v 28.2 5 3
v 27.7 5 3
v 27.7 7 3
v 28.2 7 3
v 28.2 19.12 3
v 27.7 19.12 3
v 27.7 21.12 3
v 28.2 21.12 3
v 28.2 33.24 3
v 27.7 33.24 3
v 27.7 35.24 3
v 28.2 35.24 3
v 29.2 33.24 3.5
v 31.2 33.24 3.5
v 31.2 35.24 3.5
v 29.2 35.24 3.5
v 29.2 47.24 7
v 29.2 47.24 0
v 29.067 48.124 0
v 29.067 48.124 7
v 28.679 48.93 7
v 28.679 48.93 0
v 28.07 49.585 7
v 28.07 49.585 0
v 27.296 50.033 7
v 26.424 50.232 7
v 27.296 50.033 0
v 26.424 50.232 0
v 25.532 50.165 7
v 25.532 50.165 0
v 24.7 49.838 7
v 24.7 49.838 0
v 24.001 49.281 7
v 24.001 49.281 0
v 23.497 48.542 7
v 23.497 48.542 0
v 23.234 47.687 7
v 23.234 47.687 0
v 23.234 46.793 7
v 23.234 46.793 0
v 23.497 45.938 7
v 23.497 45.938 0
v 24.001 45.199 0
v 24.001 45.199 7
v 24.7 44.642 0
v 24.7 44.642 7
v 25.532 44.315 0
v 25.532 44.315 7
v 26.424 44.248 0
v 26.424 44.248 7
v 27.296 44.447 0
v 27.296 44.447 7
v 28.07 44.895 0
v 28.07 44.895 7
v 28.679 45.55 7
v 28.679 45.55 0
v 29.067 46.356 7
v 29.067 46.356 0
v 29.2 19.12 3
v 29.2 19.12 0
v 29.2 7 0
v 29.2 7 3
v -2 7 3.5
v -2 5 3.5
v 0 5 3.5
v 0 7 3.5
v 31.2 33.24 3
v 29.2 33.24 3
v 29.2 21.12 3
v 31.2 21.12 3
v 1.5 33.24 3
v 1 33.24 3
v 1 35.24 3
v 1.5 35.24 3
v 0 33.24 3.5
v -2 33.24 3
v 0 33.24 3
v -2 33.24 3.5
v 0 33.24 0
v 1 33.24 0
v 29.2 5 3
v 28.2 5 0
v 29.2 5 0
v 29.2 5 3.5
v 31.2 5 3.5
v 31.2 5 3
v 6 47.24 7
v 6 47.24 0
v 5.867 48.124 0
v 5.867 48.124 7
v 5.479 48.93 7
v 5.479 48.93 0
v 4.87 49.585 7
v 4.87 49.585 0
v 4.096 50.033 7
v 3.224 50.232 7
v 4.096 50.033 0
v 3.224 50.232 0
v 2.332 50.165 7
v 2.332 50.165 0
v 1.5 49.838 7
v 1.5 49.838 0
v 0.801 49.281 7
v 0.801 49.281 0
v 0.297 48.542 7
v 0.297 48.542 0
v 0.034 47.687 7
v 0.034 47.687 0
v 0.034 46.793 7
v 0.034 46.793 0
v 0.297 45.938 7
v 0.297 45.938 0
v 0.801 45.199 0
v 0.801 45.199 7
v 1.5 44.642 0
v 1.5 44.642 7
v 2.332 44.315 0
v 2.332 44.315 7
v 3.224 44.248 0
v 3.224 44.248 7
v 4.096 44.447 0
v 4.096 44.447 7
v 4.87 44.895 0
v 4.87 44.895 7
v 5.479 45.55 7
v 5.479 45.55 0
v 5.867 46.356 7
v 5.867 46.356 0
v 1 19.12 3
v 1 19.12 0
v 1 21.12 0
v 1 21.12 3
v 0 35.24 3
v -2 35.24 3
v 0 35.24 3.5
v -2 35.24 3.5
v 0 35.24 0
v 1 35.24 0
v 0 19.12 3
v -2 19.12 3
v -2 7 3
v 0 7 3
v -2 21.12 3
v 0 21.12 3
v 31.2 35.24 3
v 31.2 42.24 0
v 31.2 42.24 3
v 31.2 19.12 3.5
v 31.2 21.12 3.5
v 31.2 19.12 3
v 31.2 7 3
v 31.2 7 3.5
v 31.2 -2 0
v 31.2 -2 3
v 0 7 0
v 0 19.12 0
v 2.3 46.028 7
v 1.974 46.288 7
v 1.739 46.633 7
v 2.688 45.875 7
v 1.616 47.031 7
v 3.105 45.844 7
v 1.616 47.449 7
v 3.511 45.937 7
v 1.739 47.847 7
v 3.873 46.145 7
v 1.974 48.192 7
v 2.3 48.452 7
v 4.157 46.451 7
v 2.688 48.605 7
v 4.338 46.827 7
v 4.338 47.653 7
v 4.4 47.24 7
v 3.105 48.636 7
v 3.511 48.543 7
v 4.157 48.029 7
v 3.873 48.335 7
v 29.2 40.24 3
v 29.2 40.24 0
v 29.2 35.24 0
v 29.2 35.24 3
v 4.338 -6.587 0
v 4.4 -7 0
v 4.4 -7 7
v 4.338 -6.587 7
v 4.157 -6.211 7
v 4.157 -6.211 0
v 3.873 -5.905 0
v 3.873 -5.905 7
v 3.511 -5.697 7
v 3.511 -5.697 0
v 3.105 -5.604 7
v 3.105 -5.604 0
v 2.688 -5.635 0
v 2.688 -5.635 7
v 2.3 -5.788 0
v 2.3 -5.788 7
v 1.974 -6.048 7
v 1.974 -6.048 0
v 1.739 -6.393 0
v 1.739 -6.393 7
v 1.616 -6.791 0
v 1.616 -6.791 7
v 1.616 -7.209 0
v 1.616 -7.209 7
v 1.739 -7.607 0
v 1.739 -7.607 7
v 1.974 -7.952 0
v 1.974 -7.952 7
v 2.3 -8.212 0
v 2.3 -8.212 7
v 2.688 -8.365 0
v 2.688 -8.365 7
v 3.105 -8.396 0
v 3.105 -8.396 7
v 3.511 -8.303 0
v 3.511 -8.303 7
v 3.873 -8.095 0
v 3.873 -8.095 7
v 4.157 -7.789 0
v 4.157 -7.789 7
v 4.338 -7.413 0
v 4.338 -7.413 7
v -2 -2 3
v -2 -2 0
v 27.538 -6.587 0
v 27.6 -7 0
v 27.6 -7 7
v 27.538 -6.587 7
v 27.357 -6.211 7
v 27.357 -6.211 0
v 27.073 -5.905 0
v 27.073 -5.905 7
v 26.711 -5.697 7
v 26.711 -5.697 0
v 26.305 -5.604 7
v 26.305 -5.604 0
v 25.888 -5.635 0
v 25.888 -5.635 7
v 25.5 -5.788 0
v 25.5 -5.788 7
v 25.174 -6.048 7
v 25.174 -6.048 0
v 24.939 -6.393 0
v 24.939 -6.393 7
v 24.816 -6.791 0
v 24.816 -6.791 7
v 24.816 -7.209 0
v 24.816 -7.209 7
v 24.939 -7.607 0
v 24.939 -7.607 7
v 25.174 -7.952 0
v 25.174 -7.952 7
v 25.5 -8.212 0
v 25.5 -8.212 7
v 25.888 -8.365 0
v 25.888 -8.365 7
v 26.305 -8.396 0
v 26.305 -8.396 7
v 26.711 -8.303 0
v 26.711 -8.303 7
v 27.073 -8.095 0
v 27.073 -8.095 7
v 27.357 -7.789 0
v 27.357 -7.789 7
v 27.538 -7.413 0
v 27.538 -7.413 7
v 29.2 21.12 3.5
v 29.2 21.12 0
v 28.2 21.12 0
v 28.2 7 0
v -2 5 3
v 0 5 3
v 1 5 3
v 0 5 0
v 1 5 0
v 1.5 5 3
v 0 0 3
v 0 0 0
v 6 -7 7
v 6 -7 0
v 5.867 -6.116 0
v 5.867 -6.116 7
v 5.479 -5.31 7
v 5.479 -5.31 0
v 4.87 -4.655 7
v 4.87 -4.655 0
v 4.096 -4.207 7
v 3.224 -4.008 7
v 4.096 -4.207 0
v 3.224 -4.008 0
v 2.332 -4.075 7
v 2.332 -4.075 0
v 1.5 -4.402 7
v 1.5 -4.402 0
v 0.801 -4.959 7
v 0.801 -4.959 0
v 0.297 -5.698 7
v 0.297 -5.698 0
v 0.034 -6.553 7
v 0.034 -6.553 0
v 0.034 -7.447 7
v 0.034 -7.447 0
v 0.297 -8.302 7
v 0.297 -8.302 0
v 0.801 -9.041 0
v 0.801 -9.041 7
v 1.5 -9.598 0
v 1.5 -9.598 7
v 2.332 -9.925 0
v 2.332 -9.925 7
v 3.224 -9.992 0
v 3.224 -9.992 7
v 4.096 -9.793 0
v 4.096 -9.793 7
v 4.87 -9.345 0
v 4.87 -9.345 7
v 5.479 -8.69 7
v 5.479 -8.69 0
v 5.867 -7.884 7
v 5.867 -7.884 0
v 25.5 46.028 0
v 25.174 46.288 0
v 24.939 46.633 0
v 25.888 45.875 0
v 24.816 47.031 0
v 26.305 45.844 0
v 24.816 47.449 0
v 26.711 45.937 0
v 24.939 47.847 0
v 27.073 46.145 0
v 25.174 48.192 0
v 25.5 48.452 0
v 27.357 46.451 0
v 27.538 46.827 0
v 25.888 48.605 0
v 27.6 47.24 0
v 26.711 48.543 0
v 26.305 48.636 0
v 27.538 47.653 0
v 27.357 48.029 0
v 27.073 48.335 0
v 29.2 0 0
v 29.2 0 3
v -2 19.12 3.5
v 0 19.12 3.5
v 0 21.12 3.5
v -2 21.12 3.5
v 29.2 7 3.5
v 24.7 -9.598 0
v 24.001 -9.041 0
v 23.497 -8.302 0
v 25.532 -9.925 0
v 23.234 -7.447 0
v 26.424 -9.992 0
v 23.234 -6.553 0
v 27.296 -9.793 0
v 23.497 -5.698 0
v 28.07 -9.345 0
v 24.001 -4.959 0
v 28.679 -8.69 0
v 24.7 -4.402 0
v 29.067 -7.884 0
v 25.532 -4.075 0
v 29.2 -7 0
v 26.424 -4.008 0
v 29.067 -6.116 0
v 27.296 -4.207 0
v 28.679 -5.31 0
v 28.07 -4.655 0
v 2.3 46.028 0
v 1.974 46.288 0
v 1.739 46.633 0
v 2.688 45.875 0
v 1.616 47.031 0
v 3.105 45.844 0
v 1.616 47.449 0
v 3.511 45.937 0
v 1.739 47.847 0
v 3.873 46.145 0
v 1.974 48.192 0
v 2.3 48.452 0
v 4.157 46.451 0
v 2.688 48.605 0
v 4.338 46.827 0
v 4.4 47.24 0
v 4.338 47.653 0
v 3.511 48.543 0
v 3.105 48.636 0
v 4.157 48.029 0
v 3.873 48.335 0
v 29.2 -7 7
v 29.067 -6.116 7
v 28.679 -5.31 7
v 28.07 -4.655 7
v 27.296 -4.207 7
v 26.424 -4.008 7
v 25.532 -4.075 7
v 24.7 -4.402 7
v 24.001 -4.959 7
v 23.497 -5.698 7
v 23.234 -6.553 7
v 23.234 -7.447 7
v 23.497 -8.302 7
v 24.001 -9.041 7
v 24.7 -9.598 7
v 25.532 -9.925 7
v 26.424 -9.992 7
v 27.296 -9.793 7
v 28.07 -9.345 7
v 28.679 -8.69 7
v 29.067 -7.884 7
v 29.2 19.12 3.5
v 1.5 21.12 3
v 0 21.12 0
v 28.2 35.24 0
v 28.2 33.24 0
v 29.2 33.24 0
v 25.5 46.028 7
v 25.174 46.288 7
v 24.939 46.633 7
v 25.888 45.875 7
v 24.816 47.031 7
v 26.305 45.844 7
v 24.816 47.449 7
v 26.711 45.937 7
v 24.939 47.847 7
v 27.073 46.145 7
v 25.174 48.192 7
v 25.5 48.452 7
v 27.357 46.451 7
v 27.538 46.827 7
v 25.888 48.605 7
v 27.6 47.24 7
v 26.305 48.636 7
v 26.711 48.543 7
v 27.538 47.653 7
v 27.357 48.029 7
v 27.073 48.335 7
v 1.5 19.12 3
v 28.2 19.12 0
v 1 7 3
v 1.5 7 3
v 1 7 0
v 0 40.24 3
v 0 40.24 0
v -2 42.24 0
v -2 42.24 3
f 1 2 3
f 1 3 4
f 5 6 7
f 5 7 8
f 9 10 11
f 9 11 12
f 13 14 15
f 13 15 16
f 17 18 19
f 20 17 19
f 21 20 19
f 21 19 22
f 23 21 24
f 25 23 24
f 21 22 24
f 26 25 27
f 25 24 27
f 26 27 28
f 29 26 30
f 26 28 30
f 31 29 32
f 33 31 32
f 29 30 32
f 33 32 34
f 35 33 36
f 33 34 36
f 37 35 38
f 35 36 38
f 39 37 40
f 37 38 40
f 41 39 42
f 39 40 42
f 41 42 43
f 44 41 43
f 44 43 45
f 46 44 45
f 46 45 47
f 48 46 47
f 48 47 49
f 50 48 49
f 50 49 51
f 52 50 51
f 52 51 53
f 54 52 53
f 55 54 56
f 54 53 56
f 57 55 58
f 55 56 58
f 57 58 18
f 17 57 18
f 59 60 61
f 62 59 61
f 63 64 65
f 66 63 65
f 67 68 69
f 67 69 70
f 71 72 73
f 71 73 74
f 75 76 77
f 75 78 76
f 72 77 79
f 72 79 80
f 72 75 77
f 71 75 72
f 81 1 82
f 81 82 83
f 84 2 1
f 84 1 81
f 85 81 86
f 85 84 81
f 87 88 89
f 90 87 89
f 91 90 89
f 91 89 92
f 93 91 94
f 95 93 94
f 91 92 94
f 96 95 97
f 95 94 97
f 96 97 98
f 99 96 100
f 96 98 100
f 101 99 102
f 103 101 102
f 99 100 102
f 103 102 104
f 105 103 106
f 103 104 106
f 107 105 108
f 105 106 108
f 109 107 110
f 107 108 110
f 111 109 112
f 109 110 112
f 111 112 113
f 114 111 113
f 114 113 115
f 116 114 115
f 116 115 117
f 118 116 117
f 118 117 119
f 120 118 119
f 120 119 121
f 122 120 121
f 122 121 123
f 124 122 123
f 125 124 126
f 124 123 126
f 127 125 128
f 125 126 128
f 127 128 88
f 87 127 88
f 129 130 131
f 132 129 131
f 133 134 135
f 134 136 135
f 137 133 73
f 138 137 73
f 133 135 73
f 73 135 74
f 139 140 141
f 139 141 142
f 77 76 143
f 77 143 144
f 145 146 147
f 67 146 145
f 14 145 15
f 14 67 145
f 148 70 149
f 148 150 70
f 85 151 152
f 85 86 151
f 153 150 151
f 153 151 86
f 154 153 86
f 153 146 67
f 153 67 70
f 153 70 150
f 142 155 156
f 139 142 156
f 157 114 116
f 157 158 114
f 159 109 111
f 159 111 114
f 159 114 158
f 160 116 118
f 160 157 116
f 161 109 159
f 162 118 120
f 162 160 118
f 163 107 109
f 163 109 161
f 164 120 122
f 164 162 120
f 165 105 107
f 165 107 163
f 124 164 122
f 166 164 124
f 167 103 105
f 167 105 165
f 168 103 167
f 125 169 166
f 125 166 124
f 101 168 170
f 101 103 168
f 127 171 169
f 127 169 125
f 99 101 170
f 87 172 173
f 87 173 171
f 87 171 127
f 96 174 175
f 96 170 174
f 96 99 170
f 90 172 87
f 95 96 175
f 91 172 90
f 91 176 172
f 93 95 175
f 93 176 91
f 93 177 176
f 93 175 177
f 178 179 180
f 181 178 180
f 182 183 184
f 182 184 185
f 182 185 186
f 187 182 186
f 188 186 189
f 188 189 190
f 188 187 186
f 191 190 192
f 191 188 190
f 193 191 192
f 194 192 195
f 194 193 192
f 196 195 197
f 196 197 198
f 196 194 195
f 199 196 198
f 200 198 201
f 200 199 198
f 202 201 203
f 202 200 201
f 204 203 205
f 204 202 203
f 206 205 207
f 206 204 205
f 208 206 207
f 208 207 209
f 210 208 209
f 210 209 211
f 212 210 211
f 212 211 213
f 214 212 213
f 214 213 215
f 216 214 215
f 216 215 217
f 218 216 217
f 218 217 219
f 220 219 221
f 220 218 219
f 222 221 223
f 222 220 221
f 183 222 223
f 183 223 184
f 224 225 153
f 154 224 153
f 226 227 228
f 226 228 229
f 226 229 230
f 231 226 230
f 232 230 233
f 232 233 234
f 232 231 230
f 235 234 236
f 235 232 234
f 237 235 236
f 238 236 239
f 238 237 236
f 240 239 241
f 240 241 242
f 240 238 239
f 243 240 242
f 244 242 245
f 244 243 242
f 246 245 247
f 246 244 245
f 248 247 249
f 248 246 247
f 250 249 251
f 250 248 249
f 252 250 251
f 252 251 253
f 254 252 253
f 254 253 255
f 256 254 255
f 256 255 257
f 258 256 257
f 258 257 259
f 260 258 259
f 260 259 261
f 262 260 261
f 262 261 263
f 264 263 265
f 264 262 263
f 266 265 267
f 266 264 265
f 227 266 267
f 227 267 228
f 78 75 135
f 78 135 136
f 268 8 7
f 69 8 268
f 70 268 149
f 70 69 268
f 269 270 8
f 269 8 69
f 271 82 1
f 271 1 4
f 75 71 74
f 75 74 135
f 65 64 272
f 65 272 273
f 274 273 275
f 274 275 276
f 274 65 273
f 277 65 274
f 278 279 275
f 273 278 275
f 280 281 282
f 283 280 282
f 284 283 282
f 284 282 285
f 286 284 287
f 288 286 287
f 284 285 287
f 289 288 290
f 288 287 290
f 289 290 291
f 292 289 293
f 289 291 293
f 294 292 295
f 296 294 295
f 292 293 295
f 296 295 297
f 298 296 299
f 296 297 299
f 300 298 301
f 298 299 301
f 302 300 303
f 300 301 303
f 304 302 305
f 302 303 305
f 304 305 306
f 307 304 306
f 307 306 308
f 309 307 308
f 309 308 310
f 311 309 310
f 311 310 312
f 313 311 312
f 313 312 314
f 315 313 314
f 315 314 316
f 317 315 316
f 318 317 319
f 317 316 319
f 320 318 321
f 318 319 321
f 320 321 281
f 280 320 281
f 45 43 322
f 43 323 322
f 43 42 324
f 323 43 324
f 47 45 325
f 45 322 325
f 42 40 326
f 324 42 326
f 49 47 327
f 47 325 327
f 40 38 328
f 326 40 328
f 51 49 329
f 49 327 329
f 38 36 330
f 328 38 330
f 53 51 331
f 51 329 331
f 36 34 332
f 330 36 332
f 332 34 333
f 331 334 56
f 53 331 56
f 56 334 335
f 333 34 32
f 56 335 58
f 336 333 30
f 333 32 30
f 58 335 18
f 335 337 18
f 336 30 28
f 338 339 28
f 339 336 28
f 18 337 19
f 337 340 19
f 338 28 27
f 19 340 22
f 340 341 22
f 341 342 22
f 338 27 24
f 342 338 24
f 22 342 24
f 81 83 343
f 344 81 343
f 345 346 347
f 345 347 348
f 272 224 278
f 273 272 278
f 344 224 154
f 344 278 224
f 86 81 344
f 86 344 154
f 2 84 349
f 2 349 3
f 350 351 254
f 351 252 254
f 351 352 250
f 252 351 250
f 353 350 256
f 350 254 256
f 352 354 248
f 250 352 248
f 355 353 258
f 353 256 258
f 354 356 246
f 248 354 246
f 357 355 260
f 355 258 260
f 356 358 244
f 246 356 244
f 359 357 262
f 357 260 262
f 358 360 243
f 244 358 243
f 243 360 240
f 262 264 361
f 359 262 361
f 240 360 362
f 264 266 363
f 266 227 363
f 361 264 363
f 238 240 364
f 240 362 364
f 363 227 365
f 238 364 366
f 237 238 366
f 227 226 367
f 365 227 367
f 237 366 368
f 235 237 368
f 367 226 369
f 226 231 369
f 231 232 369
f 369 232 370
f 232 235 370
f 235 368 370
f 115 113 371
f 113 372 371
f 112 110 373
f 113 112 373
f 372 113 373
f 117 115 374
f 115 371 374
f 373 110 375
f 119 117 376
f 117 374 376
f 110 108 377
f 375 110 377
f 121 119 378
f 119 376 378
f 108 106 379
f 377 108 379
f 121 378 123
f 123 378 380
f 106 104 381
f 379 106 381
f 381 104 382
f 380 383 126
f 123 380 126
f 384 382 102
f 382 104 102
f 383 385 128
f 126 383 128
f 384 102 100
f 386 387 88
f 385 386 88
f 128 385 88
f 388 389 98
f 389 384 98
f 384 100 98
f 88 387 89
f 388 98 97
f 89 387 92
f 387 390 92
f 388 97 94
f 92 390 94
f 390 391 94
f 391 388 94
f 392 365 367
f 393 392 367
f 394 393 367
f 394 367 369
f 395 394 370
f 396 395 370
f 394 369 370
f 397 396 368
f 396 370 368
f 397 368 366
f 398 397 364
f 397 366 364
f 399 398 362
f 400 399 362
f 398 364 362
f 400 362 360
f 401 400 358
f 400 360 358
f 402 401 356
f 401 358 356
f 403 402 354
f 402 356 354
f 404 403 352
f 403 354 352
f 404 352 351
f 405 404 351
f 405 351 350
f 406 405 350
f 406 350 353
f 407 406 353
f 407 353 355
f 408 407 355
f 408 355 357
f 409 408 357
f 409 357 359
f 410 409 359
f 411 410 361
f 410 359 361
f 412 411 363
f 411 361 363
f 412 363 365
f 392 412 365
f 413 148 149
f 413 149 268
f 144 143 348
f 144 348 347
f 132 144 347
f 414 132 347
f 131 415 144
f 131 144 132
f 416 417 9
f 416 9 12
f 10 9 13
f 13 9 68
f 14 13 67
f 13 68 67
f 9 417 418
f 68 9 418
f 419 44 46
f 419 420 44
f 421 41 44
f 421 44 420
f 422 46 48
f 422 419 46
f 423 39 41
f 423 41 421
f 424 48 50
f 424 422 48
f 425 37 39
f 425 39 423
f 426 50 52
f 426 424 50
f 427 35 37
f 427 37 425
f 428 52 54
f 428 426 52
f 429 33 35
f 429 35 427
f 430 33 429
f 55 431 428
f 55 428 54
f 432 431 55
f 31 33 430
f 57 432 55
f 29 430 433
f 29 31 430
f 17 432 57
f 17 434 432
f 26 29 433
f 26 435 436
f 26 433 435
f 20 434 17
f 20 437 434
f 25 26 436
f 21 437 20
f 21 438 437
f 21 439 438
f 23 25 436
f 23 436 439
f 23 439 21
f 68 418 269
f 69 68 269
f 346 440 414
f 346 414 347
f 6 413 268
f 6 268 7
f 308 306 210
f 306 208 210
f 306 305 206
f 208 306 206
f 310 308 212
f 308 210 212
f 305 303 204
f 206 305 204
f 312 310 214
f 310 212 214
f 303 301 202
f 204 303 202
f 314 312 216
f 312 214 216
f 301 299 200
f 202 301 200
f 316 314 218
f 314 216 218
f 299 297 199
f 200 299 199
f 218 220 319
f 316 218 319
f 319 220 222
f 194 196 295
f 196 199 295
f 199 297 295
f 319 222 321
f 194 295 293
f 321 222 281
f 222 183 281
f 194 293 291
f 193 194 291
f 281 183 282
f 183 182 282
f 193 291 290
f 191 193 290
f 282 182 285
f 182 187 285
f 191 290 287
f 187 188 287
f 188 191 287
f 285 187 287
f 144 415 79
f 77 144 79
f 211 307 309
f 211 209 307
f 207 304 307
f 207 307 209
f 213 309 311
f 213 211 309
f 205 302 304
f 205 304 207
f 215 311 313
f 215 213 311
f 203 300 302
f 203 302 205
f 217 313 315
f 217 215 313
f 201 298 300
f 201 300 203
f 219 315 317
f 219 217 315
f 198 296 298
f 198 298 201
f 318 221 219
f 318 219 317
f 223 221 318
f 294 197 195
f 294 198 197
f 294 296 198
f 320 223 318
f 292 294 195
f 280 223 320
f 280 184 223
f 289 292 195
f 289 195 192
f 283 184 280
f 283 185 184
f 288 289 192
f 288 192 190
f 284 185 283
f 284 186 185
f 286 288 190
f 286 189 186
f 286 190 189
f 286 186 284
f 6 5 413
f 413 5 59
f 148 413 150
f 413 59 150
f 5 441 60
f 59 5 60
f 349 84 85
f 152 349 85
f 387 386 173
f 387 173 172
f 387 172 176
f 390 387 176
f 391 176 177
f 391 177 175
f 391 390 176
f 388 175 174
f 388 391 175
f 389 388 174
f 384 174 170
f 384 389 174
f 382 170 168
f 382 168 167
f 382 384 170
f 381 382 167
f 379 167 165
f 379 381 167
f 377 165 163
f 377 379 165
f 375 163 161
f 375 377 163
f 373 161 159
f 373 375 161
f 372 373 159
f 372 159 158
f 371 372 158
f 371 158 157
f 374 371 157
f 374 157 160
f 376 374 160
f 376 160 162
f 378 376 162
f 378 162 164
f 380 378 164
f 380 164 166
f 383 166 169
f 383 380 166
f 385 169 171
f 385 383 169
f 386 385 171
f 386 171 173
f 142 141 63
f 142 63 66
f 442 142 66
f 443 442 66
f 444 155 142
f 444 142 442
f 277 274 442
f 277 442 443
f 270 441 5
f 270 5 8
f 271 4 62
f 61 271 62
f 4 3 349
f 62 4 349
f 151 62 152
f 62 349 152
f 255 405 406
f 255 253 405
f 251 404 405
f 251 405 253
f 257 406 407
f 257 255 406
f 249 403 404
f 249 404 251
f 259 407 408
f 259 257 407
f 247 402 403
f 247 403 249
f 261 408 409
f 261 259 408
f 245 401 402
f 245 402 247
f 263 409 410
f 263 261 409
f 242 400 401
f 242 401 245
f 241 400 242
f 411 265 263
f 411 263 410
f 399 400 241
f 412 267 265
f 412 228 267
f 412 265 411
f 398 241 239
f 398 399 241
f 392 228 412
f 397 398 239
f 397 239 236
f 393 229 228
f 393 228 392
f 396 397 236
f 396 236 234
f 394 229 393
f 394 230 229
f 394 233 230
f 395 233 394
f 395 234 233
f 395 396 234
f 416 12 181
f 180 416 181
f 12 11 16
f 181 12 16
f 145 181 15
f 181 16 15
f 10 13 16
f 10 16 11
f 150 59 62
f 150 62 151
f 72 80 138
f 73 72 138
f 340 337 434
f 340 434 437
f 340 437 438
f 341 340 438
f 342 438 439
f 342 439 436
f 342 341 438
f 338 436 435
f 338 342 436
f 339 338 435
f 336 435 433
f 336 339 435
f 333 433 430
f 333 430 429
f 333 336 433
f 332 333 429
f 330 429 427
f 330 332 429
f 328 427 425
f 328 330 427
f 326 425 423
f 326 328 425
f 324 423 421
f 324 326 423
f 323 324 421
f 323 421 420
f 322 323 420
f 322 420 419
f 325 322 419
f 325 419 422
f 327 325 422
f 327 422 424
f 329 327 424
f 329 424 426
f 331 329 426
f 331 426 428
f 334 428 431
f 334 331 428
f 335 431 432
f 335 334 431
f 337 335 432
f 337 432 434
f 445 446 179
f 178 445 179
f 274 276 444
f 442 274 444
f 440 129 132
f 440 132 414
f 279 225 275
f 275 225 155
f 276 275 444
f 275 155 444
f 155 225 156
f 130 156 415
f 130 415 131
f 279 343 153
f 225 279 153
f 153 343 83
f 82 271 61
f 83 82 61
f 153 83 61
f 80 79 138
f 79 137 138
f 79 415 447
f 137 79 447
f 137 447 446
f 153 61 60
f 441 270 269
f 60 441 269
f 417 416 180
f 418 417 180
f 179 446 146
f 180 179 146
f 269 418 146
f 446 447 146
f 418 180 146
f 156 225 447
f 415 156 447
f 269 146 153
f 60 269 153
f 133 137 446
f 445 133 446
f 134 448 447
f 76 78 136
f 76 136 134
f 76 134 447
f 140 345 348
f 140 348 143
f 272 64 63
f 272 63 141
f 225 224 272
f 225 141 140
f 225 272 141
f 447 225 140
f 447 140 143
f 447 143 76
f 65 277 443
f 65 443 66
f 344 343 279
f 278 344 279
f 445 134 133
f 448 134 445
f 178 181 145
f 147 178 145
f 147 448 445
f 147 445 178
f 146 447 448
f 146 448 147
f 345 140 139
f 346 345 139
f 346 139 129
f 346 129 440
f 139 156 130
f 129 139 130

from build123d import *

# Parameters (mm, degrees)
F0_W     = 33.2
F0_H     = 44.24
F0_W_2   = 1
F0_H_2   = 2
F1_DEPTH = 3
F2_W     = 2
F2_H     = 0.5
F3_DEPTH = 2
F5_DEPTH = 2
F7_DEPTH = 2
F8_R     = 3
F8_R_2   = 1.4
F9_DEPTH = 7


with BuildPart() as f1:
    # F0 (on Top) → F1 (new body)
    with BuildSketch(Plane.XY):
        with Locations((14.6, 20.12)):
            Rectangle(F0_W, F0_H)
        Polygon((29.2, 0), (0, 0), (0, 5), (0, 7), (0, 19.12), (0, 21.12), (0, 33.24), (0, 35.24), (0, 40.24), (29.2, 40.24), (29.2, 35.24), (29.2, 33.24), (29.2, 21.12), (29.2, 19.12), (29.2, 7), (29.2, 5), align=None, mode=Mode.SUBTRACT)
        with Locations((0.5, 34.24)):
            Rectangle(F0_W_2, F0_H_2)
        with Locations((0.5, 20.12)):
            Rectangle(F0_W_2, F0_H_2)
        with Locations((0.5, 6)):
            Rectangle(F0_W_2, F0_H_2)
        with Locations((28.7, 6)):
            Rectangle(F0_W_2, F0_H_2)
        with Locations((28.7, 20.12)):
            Rectangle(F0_W_2, F0_H_2)
        with Locations((28.7, 34.24)):
            Rectangle(F0_W_2, F0_H_2)
    extrude(amount=F1_DEPTH)

    # F2 (on face) → F3 (join, through all)
    with BuildSketch(Plane.XZ.offset(-5)):
        Polygon((27.7, 3), (28.2, 3), (29.2, 3), (29.2, 3.5), align=None)
        with Locations((30.2, 3.25)):
            Rectangle(F2_W, F2_H)
        Polygon((1, 3), (1.5, 3), (0, 3.5), (0, 3), align=None)
        with Locations((-1, 3.25)):
            Rectangle(F2_W, F2_H)
    extrude(amount=-F3_DEPTH)

    # F4 (on face) → F5 (join, through all)
    with BuildSketch(Plane.XZ.offset(-19.12)):
        Polygon((28.2, 3), (28.2, 0), (29.2, 0), (29.2, 3), (31.2, 3), (31.2, 3.5), (29.2, 3.5), (27.7, 3), align=None)
        Polygon((-2, 3), (0, 3), (1, 3), (1.5, 3), (0, 3.5), (-2, 3.5), align=None)
    extrude(amount=-F5_DEPTH)

    # F6 (on face) → F7 (join, through all)
    with BuildSketch(Plane.XZ.offset(-33.24)):
        Polygon((-2, 3), (0, 3), (1, 3), (1.5, 3), (0, 3.5), (-2, 3.5), align=None)
        Polygon((28.2, 3), (28.2, 0), (29.2, 0), (29.2, 3), (31.2, 3), (31.2, 3.5), (29.2, 3.5), (27.7, 3), align=None)
    extrude(amount=-F7_DEPTH)


with BuildPart() as f9:
    # F8 (on Top) → F9 (new body)
    with BuildSketch(Plane.XY):
        with Locations((3, 47.24)):
            Circle(F8_R)
        with Locations((3, 47.24)):
            Circle(F8_R_2, mode=Mode.SUBTRACT)
    extrude(amount=F9_DEPTH)


with BuildPart() as f9b:
    # F8 (on Top) → F9, piece 2 (new body)
    with BuildSketch(Plane.XY):
        with Locations((26.2, 47.24)):
            Circle(F8_R)
        with Locations((26.2, 47.24)):
            Circle(F8_R_2, mode=Mode.SUBTRACT)
    extrude(amount=F9_DEPTH)


with BuildPart() as f9c:
    # F8 (on Top) → F9, piece 3 (new body)
    with BuildSketch(Plane.XY):
        with Locations((3, -7)):
            Circle(F8_R)
        with Locations((3, -7)):
            Circle(F8_R_2, mode=Mode.SUBTRACT)
    extrude(amount=F9_DEPTH)


with BuildPart() as f9d:
    # F8 (on Top) → F9, piece 4 (new body)
    with BuildSketch(Plane.XY):
        with Locations((26.2, -7)):
            Circle(F8_R)
        with Locations((26.2, -7)):
            Circle(F8_R_2, mode=Mode.SUBTRACT)
    extrude(amount=F9_DEPTH)


solid = Compound([f1.part, f9.part, f9b.part, f9c.part, f9d.part])
